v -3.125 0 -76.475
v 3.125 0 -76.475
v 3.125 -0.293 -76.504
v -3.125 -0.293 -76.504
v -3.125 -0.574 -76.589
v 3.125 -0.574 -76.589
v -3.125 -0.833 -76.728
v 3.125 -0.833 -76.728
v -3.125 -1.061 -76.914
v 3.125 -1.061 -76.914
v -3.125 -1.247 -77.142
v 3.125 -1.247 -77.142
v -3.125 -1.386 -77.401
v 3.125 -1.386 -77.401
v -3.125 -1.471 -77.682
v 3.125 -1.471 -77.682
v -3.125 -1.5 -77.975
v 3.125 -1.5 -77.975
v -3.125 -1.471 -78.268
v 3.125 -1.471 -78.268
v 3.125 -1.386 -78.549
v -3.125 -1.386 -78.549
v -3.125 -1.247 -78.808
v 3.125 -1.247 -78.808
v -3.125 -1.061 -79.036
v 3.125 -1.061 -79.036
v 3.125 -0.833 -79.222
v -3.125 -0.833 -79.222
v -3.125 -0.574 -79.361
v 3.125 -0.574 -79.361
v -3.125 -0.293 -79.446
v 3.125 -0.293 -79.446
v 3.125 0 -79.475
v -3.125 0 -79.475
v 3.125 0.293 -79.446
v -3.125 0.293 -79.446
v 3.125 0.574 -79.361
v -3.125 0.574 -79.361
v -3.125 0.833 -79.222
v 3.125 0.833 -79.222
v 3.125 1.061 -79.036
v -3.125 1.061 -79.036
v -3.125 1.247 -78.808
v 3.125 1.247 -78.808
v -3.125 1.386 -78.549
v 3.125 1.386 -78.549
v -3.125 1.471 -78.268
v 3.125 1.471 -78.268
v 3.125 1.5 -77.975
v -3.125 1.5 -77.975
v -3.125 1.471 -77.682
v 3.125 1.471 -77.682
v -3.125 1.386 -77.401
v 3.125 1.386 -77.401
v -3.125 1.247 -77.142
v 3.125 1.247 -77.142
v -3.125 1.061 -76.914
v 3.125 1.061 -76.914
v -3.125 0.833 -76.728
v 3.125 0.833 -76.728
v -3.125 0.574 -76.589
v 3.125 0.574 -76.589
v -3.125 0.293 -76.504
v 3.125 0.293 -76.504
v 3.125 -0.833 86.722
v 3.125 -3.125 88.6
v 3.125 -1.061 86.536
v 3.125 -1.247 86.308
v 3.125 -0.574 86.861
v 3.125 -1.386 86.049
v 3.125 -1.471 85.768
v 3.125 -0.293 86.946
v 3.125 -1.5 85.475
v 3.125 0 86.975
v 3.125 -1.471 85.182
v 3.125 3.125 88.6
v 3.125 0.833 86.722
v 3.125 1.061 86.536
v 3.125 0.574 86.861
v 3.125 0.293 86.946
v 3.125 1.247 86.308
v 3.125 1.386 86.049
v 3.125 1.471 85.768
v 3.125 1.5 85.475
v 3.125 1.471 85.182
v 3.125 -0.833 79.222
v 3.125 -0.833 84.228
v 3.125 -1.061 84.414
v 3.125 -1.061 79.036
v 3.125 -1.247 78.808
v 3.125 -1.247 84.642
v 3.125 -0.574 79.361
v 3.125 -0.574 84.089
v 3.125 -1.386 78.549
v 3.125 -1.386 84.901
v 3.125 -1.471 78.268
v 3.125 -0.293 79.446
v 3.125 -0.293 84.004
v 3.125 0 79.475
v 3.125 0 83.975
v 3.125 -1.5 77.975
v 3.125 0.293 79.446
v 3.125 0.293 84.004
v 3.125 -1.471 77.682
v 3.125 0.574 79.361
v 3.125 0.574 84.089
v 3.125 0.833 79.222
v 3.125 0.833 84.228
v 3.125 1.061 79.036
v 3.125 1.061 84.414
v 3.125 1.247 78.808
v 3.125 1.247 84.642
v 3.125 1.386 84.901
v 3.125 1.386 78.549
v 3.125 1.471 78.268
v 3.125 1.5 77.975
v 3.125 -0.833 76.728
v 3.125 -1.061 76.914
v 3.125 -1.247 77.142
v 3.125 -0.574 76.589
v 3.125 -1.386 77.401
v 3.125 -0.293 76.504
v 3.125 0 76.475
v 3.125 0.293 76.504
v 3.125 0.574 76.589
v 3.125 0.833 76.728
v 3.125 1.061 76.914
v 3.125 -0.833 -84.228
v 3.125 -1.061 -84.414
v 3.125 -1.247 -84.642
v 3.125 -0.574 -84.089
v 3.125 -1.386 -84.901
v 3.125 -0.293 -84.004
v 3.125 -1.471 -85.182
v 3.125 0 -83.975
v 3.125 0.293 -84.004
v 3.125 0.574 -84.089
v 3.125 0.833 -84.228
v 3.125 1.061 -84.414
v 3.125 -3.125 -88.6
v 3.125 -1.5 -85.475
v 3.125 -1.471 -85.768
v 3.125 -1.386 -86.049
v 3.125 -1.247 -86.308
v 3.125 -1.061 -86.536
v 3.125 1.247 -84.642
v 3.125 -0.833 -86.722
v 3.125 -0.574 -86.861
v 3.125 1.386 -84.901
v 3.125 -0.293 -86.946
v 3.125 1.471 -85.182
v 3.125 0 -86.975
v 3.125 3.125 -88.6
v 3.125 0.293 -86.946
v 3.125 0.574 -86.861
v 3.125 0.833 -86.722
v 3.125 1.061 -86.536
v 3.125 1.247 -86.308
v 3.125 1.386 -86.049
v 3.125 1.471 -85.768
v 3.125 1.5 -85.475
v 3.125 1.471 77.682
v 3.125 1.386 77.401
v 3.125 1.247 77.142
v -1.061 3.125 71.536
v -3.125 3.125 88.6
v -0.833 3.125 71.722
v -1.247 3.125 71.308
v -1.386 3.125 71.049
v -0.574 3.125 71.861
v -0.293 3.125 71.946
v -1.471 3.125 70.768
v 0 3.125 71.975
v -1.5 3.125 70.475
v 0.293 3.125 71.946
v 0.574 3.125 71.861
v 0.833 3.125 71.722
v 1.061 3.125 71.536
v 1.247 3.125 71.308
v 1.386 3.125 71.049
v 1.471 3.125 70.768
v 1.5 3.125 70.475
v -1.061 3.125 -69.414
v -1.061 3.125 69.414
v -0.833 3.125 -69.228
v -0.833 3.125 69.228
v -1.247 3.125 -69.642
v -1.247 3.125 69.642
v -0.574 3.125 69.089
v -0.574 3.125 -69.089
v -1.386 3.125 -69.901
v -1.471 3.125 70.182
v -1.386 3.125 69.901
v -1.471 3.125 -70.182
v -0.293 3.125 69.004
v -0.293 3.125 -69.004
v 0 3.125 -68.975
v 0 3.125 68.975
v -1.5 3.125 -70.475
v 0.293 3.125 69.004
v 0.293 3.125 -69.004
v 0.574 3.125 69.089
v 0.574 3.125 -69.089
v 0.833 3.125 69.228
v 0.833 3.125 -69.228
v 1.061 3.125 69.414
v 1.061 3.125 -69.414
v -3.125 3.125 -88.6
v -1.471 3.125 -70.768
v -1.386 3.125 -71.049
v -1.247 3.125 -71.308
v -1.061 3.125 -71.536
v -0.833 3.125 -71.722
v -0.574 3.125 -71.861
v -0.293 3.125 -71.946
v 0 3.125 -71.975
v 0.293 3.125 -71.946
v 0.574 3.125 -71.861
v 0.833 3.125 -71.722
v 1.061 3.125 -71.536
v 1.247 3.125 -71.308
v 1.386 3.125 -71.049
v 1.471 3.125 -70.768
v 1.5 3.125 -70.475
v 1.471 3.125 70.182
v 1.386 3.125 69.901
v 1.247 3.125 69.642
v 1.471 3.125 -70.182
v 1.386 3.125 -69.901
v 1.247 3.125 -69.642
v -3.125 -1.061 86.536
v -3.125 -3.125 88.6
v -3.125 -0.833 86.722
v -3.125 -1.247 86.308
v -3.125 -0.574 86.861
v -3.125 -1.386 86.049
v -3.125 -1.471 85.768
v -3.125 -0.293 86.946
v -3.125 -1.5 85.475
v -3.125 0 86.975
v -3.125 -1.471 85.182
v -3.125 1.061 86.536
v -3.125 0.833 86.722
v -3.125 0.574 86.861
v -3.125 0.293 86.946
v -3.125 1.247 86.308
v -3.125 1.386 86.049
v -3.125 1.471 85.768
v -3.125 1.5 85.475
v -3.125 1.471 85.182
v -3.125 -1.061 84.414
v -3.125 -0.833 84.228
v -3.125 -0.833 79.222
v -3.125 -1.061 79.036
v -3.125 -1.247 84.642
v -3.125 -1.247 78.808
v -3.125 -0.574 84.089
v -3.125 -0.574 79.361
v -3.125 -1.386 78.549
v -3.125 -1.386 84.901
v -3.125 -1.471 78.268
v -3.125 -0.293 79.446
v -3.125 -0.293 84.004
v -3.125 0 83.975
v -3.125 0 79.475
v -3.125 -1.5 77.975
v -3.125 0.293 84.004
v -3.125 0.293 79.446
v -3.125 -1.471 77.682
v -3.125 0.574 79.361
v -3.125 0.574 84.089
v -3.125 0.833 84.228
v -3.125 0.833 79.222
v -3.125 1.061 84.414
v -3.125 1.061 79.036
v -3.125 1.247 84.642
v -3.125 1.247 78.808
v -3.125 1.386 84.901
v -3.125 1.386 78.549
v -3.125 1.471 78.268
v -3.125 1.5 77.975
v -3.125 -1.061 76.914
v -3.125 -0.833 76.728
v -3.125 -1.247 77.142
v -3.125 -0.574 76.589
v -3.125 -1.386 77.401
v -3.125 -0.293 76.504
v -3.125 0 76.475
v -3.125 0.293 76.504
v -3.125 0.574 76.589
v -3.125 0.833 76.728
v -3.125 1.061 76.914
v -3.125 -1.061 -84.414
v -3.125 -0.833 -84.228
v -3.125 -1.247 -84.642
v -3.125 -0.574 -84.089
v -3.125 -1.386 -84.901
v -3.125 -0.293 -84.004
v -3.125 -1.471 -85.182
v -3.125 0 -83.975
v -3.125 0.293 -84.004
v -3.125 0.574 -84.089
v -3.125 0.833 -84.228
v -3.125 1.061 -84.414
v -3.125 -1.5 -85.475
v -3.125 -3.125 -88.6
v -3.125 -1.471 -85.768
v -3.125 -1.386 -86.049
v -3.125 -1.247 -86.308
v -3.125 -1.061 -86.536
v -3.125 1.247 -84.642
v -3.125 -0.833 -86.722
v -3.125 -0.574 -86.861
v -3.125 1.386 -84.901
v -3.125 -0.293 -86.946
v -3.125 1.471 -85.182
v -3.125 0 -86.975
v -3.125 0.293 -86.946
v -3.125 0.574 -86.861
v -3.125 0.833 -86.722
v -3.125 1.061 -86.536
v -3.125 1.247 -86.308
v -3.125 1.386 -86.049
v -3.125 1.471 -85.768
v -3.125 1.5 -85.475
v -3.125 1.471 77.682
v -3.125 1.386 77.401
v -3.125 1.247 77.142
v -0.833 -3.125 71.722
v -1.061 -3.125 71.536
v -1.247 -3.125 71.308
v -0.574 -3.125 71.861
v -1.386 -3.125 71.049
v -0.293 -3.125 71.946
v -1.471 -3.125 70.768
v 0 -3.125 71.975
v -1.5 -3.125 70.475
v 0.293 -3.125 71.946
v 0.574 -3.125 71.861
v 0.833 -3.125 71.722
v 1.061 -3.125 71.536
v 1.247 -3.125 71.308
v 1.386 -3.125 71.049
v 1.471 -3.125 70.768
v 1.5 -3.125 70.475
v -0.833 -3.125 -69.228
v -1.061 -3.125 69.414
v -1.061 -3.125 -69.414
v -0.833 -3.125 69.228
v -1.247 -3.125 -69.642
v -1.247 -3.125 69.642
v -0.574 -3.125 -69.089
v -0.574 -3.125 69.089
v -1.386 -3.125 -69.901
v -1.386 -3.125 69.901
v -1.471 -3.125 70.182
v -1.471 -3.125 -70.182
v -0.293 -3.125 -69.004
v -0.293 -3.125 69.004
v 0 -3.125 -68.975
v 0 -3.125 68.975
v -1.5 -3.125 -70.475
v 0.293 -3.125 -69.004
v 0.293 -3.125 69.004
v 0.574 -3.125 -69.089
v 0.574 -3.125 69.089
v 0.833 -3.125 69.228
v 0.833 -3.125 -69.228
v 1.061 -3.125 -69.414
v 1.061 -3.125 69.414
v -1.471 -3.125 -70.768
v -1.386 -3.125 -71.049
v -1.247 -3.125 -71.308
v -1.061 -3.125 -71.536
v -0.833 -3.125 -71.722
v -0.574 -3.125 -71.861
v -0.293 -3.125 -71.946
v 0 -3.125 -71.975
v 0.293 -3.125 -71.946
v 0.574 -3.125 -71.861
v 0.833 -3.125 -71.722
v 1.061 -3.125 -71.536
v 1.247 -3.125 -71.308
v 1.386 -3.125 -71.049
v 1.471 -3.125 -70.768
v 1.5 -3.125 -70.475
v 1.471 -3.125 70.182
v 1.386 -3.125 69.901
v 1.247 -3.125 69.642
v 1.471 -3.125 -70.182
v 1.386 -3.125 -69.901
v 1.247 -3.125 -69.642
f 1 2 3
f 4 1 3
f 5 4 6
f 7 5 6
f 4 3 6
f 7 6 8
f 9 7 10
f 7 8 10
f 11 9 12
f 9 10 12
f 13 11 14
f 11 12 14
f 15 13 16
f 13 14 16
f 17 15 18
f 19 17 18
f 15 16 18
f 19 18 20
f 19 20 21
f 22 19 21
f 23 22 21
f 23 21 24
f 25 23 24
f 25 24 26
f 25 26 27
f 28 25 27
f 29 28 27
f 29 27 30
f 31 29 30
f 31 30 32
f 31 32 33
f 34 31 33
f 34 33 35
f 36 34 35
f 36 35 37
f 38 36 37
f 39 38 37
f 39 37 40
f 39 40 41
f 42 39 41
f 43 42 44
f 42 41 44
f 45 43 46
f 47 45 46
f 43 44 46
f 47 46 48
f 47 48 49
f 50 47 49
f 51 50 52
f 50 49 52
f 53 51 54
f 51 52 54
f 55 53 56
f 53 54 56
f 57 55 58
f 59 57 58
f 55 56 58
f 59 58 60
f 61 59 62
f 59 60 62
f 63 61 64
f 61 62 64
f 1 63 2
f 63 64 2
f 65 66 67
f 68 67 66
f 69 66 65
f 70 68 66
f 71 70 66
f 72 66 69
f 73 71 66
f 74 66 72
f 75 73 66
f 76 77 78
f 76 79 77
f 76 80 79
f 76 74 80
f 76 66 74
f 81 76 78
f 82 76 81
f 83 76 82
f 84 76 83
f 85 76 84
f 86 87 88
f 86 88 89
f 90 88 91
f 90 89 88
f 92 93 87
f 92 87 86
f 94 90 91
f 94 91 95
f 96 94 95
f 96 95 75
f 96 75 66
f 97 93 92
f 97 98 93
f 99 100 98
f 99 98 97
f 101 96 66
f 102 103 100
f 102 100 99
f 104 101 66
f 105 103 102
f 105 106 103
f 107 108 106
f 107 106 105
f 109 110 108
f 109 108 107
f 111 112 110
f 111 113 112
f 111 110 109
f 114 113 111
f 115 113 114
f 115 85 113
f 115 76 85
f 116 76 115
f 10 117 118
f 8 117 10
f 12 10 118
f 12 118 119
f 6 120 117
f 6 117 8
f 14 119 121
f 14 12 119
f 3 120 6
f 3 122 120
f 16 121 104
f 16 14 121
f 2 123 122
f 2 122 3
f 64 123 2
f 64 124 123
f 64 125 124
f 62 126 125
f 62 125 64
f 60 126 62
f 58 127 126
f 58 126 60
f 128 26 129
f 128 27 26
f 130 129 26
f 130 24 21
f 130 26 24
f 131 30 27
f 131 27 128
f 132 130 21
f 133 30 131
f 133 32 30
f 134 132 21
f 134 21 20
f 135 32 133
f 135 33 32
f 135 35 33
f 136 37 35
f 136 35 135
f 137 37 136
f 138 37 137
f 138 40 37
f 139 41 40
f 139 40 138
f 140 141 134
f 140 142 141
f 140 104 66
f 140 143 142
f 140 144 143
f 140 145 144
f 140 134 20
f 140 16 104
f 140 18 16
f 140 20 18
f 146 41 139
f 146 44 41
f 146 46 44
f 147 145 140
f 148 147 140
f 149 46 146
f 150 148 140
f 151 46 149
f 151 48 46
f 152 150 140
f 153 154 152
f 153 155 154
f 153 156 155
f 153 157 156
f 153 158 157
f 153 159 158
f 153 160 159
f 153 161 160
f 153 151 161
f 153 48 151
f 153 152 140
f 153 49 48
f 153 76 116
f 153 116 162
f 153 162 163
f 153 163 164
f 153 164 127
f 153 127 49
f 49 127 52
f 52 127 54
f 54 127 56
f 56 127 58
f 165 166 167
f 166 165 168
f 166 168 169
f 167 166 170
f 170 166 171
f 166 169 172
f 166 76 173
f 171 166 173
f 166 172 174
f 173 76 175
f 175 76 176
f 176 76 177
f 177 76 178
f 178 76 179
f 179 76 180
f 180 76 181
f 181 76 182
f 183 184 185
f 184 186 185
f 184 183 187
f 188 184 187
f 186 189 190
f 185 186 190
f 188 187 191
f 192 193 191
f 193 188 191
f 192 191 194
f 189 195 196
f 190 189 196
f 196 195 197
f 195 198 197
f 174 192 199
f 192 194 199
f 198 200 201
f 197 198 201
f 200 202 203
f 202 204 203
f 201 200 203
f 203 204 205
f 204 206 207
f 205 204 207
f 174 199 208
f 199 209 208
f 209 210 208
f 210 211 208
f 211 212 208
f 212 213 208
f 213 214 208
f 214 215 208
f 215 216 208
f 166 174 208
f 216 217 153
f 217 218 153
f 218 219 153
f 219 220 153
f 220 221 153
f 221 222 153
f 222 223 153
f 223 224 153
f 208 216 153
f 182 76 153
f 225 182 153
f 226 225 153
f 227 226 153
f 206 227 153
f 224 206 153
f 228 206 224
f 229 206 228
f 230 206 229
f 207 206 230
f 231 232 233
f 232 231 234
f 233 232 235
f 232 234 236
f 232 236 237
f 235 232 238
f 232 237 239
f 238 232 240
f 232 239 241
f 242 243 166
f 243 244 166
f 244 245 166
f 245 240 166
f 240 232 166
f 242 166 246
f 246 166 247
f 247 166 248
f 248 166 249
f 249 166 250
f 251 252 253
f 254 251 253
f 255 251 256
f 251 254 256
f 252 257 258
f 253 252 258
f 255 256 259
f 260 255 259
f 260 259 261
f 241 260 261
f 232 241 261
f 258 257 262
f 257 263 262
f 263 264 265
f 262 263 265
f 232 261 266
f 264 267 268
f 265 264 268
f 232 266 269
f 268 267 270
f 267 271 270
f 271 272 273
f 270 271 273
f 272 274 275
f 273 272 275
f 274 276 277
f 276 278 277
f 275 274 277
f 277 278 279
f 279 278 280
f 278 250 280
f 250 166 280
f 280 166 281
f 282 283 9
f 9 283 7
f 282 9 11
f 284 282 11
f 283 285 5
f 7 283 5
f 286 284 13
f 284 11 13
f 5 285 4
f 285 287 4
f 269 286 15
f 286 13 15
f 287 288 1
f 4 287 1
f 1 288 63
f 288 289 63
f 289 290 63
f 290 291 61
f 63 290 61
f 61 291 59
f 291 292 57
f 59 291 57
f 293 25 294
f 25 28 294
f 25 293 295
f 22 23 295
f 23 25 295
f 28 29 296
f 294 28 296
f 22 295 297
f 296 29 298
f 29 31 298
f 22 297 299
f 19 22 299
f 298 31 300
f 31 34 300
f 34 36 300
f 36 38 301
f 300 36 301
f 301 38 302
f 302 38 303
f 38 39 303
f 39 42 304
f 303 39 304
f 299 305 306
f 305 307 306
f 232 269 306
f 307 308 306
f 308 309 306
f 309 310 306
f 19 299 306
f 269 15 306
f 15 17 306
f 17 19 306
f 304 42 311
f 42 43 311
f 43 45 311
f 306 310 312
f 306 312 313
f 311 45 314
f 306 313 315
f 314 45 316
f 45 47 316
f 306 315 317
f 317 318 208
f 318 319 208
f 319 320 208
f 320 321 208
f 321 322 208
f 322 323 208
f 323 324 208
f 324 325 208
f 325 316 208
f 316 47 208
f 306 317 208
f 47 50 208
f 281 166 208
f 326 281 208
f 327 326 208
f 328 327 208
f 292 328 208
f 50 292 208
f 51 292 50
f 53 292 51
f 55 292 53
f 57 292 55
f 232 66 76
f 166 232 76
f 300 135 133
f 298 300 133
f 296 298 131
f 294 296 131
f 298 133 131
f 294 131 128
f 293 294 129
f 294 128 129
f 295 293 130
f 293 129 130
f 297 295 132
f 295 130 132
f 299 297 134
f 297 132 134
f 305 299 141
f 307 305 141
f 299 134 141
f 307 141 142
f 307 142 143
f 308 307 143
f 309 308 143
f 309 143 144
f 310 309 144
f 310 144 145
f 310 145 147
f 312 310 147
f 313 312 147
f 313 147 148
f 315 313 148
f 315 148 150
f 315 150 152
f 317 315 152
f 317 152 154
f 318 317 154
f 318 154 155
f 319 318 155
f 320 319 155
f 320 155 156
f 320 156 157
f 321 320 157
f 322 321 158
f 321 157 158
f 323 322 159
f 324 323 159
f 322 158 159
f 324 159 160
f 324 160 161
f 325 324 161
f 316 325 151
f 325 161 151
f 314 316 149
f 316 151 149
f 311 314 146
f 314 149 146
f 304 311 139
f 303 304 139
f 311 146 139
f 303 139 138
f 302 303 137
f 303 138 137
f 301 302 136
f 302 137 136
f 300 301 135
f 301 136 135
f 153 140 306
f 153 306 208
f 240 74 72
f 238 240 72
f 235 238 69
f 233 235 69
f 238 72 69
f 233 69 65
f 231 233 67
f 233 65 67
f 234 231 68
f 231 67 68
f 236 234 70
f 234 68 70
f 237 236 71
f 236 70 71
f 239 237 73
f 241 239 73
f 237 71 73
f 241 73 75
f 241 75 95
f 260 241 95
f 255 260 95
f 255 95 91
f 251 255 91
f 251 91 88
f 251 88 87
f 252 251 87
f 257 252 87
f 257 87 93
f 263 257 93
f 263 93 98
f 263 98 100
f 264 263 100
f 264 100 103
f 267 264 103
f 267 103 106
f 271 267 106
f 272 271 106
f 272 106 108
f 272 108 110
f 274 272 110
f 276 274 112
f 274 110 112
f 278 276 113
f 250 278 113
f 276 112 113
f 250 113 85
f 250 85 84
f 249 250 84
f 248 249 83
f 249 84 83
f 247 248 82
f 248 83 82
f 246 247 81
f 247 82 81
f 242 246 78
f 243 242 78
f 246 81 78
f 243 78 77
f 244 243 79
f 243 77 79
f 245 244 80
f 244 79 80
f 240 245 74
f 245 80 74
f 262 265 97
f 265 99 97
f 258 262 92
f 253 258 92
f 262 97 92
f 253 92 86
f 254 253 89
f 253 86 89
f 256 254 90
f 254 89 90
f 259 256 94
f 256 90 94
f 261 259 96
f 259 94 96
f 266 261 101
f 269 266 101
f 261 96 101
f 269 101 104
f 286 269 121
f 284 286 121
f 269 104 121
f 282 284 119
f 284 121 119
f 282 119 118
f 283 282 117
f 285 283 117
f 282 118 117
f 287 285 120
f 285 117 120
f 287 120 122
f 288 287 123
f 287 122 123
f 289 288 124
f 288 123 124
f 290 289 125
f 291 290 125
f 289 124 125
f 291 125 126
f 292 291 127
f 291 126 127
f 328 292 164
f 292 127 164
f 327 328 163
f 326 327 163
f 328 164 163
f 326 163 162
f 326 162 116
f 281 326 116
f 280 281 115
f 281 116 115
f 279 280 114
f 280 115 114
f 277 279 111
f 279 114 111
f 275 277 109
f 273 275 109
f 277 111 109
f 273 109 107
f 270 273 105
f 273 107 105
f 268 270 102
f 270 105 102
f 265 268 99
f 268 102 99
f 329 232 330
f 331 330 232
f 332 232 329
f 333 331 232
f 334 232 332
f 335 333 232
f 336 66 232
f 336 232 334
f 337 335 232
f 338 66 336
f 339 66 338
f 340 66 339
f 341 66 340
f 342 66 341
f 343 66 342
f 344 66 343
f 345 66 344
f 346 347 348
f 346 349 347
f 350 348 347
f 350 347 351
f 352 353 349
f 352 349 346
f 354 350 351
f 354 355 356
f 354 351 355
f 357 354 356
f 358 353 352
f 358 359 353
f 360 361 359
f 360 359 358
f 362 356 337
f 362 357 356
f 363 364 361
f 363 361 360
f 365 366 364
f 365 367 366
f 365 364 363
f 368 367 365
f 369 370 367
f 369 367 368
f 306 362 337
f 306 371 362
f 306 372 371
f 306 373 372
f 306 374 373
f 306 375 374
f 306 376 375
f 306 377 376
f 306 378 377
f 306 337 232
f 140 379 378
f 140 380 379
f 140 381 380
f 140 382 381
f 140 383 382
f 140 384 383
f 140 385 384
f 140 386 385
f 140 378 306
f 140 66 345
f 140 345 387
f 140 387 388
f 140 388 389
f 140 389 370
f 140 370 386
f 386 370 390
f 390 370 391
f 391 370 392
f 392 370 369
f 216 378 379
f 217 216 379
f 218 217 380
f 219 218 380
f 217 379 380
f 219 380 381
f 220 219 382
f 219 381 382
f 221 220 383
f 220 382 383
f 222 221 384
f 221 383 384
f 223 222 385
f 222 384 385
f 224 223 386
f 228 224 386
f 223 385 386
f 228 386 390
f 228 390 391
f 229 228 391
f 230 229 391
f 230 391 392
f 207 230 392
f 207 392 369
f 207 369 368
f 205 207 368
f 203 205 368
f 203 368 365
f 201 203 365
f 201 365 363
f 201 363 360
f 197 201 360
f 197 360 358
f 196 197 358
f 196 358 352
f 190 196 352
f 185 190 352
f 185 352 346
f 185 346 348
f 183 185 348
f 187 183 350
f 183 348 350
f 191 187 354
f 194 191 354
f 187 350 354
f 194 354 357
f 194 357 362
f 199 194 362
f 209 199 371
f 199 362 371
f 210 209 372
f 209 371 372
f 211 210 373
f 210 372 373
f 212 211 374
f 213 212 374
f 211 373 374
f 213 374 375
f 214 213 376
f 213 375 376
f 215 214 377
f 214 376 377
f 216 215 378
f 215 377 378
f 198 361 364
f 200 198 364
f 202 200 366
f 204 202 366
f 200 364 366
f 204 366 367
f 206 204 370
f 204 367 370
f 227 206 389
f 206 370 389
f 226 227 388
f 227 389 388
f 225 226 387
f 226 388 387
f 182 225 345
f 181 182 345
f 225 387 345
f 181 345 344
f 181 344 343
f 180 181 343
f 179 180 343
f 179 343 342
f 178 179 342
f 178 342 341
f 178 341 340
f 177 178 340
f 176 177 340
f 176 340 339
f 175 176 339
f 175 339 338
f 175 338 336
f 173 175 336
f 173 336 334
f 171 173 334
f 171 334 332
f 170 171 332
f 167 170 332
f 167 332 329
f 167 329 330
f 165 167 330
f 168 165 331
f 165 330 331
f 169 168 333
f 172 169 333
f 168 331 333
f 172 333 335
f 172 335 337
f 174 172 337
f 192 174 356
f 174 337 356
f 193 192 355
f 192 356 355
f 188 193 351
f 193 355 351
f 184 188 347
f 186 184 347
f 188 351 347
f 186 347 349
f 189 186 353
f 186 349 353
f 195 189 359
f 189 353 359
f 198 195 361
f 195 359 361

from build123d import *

# Parameters (mm, degrees)
CROQUIS1_W              = 177.2
CROQUIS1_H              = 6.25
SALIENTE_EXTRUIR1_DEPTH = 3.125
CROQUIS4_R              = 1.5
CORTAR_EXTRUIR1_DEPTH   = 15
CROQUIS5_R              = 1.5
CORTAR_EXTRUIR3_DEPTH   = 368


with BuildPart() as part:
    # Croquis1 → Saliente-Extruir1 (new, symmetric)
    with BuildSketch(Plane(origin=(0, 0, 0), x_dir=(0, 0, -1), z_dir=(1, 0, 0))):
        Rectangle(CROQUIS1_W, CROQUIS1_H)
    extrude(amount=SALIENTE_EXTRUIR1_DEPTH, both=True)

    # Croquis4 → Cortar-Extruir1 (cut, symmetric)
    with BuildSketch(Plane(origin=(3.125, 0, 0), x_dir=(0, 0, -1), z_dir=(1, 0, 0))):
        with Locations(Location((85.475, 0, 0), (0, 0, 180))):
            Circle(CROQUIS4_R)
        with Locations(Location((77.975, 0, 0), (0, 0, 180))):
            Circle(CROQUIS4_R)
        with Locations(Location((-85.475, 0, 0), (0, 0, 180))):
            Circle(CROQUIS4_R)
        with Locations(Location((-77.975, 0, 0), (0, 0, 180))):
            Circle(CROQUIS4_R)
    extrude(amount=CORTAR_EXTRUIR1_DEPTH, both=True, mode=Mode.SUBTRACT)

    # Croquis5 → Cortar-Extruir3 (cut)
    with BuildSketch(Plane.XZ.offset(3.125)):
        with Locations(Location((0, -70.475, 0), (0, 0, 270))):
            Circle(CROQUIS5_R)
        with Locations(Location((0, 70.475, 0), (0, 0, 270))):
            Circle(CROQUIS5_R)
    extrude(amount=-CORTAR_EXTRUIR3_DEPTH, mode=Mode.SUBTRACT)


solid = part.part
